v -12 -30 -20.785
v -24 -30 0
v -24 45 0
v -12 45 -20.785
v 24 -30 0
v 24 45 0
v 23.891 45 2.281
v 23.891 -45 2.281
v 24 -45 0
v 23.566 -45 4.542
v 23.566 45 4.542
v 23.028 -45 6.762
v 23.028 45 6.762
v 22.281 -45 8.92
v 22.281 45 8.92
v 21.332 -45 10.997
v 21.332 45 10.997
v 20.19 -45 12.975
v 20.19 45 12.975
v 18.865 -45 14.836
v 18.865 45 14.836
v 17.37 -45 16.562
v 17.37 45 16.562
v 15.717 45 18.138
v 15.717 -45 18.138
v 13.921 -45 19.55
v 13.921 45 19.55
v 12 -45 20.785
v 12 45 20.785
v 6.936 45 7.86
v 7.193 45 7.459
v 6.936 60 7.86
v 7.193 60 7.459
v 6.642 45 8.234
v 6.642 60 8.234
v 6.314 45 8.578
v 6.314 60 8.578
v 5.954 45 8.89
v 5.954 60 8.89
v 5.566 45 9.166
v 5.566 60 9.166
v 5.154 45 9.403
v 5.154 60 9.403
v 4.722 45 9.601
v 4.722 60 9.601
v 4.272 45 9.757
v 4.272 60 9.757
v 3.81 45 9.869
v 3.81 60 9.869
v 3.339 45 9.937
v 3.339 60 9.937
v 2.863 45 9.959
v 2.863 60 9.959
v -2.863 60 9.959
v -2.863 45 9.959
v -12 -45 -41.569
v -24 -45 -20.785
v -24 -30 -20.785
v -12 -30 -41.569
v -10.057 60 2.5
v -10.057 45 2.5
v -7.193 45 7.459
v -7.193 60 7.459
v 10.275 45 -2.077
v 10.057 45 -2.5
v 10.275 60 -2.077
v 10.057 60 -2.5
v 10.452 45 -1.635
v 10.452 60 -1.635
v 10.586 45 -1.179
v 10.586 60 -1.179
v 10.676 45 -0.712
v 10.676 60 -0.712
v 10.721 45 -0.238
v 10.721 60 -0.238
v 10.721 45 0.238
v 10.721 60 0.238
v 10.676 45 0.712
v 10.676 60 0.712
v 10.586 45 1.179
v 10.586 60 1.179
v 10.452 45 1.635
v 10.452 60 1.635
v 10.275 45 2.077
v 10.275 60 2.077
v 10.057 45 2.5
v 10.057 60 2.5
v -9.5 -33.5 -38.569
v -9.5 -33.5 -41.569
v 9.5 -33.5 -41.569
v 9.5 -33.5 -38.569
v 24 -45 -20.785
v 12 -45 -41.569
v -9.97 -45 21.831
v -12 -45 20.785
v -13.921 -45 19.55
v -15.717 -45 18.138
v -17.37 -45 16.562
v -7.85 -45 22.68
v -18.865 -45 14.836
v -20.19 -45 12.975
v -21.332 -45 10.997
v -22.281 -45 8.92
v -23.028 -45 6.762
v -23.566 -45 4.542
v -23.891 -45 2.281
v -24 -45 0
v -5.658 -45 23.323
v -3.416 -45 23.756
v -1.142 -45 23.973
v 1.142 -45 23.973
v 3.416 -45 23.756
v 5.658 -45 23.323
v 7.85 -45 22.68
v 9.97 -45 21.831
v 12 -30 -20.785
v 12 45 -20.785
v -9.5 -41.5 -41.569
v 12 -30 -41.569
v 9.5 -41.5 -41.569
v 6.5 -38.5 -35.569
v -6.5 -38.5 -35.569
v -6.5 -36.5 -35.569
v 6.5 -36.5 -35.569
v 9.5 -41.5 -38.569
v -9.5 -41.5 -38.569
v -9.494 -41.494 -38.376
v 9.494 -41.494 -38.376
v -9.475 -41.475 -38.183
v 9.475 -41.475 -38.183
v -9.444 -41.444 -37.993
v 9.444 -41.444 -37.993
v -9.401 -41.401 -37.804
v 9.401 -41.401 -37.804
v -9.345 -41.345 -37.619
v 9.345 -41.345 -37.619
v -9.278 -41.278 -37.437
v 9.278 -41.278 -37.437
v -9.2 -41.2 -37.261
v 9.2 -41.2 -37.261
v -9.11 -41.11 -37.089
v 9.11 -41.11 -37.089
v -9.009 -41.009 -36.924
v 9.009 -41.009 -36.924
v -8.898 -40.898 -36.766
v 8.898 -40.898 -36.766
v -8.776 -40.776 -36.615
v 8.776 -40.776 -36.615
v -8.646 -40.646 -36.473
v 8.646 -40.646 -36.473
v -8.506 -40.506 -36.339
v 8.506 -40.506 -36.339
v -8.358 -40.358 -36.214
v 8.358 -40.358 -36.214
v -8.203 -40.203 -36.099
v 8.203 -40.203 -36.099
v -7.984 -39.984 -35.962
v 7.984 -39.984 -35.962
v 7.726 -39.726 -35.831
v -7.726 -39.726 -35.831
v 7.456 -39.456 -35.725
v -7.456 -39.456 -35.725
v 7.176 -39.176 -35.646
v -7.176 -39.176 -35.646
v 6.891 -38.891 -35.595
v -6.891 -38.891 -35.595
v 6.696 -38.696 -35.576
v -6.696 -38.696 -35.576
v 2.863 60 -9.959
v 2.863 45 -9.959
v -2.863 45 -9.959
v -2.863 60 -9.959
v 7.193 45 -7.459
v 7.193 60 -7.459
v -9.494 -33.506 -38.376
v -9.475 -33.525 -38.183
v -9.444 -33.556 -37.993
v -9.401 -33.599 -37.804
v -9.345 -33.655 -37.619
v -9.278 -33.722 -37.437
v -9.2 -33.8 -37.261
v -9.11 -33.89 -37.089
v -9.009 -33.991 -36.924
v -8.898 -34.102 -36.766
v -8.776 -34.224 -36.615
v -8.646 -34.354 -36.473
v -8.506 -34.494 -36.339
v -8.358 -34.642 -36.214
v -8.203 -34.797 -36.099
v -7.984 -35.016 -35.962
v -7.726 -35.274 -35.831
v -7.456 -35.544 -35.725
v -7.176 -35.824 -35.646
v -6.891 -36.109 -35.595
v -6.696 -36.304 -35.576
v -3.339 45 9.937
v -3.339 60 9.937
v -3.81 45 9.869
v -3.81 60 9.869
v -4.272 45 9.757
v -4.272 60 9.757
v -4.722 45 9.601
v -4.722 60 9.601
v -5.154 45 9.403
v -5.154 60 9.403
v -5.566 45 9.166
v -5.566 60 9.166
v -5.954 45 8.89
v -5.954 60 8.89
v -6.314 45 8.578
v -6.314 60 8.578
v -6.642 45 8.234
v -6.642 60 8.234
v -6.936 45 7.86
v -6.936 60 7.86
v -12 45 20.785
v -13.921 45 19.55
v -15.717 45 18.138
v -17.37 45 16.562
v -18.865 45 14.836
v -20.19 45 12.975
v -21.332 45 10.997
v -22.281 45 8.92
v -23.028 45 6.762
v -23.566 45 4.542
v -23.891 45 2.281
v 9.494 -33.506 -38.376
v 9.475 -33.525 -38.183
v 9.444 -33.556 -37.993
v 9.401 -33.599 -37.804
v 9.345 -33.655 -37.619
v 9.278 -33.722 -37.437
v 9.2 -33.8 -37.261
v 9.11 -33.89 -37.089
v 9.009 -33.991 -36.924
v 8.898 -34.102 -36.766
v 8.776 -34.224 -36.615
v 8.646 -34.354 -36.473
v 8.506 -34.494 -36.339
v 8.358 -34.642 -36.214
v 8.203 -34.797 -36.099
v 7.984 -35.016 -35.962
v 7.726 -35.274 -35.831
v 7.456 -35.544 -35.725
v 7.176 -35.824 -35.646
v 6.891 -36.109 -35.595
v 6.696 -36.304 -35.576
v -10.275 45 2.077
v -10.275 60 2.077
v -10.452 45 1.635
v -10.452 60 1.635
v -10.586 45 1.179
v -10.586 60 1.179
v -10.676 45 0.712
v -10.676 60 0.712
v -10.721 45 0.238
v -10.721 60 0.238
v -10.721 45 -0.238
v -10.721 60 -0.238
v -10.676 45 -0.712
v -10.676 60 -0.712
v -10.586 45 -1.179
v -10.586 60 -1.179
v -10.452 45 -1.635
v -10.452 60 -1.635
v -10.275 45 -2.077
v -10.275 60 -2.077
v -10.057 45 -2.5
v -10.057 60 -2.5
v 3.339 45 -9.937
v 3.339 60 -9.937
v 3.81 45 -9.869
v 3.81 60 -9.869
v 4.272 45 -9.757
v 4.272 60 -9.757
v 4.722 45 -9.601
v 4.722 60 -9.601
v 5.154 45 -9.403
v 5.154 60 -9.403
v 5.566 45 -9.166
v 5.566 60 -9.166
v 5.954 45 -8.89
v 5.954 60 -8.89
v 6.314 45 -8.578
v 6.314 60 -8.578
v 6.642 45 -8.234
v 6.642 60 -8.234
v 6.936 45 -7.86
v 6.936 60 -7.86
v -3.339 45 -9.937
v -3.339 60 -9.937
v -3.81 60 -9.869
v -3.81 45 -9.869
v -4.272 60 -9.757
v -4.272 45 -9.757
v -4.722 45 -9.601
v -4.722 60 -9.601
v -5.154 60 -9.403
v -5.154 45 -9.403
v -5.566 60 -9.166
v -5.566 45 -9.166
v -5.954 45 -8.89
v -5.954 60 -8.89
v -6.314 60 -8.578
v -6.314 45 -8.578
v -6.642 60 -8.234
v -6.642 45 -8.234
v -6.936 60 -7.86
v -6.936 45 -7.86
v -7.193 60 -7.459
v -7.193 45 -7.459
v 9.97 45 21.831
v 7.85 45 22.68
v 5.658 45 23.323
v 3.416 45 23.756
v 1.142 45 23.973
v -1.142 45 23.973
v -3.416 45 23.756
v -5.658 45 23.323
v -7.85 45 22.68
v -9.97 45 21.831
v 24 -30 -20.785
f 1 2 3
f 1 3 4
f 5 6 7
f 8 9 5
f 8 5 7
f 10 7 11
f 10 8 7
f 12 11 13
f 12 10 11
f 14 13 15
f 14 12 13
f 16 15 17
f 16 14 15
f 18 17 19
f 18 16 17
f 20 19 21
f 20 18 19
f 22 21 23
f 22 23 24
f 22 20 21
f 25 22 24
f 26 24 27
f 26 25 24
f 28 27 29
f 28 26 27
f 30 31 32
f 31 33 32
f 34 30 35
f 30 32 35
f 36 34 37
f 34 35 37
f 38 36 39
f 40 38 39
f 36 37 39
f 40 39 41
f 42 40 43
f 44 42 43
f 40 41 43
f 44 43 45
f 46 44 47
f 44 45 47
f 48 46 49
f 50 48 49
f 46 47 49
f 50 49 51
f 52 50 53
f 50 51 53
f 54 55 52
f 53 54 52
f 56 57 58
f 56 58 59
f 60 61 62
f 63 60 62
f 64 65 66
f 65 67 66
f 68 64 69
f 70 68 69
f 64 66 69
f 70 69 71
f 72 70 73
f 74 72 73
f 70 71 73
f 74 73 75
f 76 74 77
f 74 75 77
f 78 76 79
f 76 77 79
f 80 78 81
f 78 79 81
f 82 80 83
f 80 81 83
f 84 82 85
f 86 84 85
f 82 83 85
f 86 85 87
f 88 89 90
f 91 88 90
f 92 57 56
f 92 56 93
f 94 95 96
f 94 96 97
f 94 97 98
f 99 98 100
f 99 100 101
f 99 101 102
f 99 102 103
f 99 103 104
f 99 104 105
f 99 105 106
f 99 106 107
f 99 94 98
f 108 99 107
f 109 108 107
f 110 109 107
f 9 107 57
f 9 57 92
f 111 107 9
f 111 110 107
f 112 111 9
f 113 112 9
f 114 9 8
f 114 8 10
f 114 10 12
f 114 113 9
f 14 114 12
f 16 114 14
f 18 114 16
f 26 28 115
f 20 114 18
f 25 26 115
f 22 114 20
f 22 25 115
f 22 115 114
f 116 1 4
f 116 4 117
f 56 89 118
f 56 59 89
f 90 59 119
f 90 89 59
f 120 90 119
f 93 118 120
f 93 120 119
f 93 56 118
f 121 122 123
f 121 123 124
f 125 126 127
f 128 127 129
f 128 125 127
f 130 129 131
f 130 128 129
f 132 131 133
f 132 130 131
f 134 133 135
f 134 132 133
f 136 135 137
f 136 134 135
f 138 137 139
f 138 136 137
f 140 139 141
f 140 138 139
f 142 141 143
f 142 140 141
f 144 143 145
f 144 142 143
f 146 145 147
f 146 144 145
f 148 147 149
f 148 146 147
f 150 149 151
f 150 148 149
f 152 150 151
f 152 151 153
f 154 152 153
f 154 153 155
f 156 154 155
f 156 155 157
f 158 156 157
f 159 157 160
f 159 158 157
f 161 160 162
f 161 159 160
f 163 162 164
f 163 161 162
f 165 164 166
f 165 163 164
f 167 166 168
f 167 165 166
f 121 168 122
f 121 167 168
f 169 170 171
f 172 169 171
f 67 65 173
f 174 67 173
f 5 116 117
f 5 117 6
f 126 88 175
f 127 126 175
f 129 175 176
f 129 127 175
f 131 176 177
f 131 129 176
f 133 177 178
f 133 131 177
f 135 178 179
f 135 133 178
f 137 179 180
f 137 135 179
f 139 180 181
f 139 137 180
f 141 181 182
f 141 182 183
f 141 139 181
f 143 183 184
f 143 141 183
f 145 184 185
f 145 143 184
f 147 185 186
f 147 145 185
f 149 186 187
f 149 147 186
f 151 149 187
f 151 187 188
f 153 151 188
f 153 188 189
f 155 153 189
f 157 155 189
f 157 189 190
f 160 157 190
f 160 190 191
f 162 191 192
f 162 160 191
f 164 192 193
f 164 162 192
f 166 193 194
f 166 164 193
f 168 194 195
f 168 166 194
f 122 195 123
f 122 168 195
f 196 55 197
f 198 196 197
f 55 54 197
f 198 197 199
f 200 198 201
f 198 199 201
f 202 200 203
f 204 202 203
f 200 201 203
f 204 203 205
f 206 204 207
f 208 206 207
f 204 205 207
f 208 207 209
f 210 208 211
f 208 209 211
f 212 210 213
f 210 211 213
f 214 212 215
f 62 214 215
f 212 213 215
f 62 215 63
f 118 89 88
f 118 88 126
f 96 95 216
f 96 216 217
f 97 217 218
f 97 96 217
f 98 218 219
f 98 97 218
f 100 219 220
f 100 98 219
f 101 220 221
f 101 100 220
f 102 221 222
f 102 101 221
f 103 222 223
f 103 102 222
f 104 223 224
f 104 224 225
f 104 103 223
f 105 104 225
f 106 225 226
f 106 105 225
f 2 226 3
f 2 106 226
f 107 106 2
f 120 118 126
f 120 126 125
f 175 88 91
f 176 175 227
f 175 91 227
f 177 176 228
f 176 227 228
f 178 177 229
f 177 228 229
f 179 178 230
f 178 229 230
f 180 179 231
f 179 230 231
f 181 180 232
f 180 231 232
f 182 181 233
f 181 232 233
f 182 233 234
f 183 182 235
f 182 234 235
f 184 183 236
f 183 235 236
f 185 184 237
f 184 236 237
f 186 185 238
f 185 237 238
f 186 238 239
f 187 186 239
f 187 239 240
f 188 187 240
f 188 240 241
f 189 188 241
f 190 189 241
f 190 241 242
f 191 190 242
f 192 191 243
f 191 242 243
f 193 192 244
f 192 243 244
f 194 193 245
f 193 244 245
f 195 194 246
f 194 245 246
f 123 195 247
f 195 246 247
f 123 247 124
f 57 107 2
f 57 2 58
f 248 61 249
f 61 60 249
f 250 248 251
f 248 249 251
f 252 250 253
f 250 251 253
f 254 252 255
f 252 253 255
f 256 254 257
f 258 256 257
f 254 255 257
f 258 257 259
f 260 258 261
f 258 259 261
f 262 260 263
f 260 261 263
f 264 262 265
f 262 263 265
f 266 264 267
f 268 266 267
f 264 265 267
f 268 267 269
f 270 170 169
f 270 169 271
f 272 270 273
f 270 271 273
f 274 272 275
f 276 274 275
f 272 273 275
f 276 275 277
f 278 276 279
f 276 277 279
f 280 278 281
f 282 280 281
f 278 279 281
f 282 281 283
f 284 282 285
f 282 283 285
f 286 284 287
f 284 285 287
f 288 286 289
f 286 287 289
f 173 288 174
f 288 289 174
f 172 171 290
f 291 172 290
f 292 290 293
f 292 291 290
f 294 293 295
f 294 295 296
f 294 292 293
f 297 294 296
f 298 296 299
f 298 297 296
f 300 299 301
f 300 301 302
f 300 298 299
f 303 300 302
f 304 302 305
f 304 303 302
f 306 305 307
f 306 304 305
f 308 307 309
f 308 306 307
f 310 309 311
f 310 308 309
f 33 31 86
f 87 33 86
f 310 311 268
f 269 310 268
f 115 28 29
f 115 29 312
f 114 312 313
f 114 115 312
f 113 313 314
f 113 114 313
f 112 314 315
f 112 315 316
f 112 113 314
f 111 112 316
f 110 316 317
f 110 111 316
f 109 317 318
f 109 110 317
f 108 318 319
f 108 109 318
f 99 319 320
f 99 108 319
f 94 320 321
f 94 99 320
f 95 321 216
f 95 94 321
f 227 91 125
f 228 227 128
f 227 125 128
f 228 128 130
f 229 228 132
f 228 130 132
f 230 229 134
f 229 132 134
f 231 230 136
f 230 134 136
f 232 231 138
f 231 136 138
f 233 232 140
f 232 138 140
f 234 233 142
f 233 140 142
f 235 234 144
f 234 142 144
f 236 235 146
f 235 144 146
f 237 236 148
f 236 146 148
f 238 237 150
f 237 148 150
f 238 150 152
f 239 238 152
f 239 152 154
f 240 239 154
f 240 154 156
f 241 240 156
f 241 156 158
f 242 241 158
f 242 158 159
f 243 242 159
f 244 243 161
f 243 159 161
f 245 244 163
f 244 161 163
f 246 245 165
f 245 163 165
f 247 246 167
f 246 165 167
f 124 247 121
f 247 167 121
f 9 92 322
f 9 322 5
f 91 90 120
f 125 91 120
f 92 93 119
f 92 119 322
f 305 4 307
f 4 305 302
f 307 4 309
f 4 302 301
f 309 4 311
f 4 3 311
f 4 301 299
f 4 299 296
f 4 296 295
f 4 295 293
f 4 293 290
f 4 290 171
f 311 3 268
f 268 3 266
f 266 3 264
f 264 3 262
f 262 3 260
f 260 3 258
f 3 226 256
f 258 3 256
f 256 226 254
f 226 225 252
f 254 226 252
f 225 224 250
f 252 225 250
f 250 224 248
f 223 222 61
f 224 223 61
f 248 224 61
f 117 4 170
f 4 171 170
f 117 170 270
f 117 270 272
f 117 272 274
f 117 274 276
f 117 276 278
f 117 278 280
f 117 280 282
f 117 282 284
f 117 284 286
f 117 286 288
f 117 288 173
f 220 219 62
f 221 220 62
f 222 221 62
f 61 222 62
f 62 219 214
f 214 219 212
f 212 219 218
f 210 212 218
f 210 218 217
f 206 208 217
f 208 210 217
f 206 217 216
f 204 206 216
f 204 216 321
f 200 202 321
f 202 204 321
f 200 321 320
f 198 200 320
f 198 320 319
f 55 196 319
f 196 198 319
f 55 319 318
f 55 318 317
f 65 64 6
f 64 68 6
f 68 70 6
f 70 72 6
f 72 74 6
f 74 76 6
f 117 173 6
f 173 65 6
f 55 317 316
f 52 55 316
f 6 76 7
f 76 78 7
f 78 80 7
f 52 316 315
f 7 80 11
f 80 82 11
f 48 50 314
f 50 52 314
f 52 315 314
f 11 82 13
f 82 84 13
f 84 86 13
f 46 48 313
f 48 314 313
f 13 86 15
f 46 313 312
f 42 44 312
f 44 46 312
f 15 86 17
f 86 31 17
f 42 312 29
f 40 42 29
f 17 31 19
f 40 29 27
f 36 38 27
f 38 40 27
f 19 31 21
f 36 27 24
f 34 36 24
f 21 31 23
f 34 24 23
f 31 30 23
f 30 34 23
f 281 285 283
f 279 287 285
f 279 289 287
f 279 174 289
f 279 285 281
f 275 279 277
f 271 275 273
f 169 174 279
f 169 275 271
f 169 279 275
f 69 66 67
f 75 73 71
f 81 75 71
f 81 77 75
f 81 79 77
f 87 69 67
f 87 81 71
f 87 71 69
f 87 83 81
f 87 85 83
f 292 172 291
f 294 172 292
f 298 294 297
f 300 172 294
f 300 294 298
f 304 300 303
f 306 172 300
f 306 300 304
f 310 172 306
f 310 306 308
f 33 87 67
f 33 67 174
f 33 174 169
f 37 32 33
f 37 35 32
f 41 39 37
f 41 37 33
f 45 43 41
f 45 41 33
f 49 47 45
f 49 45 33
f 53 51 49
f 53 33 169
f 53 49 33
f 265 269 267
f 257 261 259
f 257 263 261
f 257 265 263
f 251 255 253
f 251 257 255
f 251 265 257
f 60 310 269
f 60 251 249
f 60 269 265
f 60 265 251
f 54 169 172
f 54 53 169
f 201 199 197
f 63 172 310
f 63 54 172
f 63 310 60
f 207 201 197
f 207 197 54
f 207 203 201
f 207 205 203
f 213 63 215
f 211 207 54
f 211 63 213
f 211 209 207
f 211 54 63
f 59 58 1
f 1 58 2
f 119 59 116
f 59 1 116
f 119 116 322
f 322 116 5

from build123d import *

# Parameters (mm, degrees)
F1_DEPTH = 45
F3_DEPTH = 15
F4_W     = 19
F4_H     = 8
F5_DEPTH = 6
F7_DEPTH = 15
F8_R     = 3
F9_R     = 5


with BuildPart() as f1:
    # F0 (on Front) → F1 (new body, symmetric)
    with BuildSketch(Plane.XZ):
        Polygon((12, -20.78461), (24, 0), (12, 20.78461), (-12, 20.78461), (-24, 0), (-12, -20.78461), align=None)
        with BuildLine():
            Line((12, 20.78461), (24, 0))
            ThreePointArc((24, 0), (20.78461, 12), (12, 20.78461))
        make_face()
        with BuildLine():
            Line((-12, 20.78461), (12, 20.78461))
            ThreePointArc((12, 20.78461), (0, 24), (-12, 20.78461))
        make_face()
        with BuildLine():
            Line((-24, 0), (-12, 20.78461))
            ThreePointArc((-12, 20.78461), (-20.78461, 12), (-24, 0))
        make_face()
    extrude(amount=F1_DEPTH, both=True)

    # F2 (on face) → F3 (join)
    with BuildSketch(Plane.XZ.offset(45)):
        Polygon((-12, -41.569219), (12, -41.569219), (24, -20.78461), (12, 0), (-12, 0), (-24, -20.78461), align=None)
        Polygon((-24, 0), (-24, -20.78461), (-18, -10.392305), align=None)
        Polygon((18, -10.392305), (24, -20.78461), (24, 0), align=None)
    extrude(amount=-F3_DEPTH)

    # F4 (on face) → F5 (cut)
    with BuildSketch(Plane(origin=(0, 0, -41.569219), x_dir=(1, 0, 0), z_dir=(0, 0, -1))):
        with Locations((0, 37.5)):
            Rectangle(F4_W, F4_H)
    extrude(amount=-F5_DEPTH, mode=Mode.SUBTRACT)

    # F6 (on face) → F7 (join)
    with BuildSketch(Plane(origin=(0, 45, 0), x_dir=(-1, 0, 0), z_dir=(0, 1, 0))):
        Polygon((5.75, -9.959292), (11.5, 0), (5.75, 9.959292), (-5.75, 9.959292), (-11.5, 0), (-5.75, -9.959292), align=None)
    extrude(amount=F7_DEPTH)

    # F8
    f8_edges = [f1.edges().sort_by_distance(p)[0] for p in [
        (9.5, -37.5, -35.569219),
        (0, -41.5, -35.569219),
        (-9.5, -37.5, -35.569219),
        (0, -33.5, -35.569219),
    ]]
    fillet(f8_edges, radius=F8_R)

    # F9
    f9_edges = [f1.edges().sort_by_distance(p)[0] for p in [
        (11.5, 52.5, 0),
        (5.75, 52.5, 9.959292),
        (-5.75, 52.5, 9.959292),
        (-11.5, 52.5, 0),
        (-5.75, 52.5, -9.959292),
        (5.75, 52.5, -9.959292),
    ]]
    fillet(f9_edges, radius=F9_R)


solid = f1.part
